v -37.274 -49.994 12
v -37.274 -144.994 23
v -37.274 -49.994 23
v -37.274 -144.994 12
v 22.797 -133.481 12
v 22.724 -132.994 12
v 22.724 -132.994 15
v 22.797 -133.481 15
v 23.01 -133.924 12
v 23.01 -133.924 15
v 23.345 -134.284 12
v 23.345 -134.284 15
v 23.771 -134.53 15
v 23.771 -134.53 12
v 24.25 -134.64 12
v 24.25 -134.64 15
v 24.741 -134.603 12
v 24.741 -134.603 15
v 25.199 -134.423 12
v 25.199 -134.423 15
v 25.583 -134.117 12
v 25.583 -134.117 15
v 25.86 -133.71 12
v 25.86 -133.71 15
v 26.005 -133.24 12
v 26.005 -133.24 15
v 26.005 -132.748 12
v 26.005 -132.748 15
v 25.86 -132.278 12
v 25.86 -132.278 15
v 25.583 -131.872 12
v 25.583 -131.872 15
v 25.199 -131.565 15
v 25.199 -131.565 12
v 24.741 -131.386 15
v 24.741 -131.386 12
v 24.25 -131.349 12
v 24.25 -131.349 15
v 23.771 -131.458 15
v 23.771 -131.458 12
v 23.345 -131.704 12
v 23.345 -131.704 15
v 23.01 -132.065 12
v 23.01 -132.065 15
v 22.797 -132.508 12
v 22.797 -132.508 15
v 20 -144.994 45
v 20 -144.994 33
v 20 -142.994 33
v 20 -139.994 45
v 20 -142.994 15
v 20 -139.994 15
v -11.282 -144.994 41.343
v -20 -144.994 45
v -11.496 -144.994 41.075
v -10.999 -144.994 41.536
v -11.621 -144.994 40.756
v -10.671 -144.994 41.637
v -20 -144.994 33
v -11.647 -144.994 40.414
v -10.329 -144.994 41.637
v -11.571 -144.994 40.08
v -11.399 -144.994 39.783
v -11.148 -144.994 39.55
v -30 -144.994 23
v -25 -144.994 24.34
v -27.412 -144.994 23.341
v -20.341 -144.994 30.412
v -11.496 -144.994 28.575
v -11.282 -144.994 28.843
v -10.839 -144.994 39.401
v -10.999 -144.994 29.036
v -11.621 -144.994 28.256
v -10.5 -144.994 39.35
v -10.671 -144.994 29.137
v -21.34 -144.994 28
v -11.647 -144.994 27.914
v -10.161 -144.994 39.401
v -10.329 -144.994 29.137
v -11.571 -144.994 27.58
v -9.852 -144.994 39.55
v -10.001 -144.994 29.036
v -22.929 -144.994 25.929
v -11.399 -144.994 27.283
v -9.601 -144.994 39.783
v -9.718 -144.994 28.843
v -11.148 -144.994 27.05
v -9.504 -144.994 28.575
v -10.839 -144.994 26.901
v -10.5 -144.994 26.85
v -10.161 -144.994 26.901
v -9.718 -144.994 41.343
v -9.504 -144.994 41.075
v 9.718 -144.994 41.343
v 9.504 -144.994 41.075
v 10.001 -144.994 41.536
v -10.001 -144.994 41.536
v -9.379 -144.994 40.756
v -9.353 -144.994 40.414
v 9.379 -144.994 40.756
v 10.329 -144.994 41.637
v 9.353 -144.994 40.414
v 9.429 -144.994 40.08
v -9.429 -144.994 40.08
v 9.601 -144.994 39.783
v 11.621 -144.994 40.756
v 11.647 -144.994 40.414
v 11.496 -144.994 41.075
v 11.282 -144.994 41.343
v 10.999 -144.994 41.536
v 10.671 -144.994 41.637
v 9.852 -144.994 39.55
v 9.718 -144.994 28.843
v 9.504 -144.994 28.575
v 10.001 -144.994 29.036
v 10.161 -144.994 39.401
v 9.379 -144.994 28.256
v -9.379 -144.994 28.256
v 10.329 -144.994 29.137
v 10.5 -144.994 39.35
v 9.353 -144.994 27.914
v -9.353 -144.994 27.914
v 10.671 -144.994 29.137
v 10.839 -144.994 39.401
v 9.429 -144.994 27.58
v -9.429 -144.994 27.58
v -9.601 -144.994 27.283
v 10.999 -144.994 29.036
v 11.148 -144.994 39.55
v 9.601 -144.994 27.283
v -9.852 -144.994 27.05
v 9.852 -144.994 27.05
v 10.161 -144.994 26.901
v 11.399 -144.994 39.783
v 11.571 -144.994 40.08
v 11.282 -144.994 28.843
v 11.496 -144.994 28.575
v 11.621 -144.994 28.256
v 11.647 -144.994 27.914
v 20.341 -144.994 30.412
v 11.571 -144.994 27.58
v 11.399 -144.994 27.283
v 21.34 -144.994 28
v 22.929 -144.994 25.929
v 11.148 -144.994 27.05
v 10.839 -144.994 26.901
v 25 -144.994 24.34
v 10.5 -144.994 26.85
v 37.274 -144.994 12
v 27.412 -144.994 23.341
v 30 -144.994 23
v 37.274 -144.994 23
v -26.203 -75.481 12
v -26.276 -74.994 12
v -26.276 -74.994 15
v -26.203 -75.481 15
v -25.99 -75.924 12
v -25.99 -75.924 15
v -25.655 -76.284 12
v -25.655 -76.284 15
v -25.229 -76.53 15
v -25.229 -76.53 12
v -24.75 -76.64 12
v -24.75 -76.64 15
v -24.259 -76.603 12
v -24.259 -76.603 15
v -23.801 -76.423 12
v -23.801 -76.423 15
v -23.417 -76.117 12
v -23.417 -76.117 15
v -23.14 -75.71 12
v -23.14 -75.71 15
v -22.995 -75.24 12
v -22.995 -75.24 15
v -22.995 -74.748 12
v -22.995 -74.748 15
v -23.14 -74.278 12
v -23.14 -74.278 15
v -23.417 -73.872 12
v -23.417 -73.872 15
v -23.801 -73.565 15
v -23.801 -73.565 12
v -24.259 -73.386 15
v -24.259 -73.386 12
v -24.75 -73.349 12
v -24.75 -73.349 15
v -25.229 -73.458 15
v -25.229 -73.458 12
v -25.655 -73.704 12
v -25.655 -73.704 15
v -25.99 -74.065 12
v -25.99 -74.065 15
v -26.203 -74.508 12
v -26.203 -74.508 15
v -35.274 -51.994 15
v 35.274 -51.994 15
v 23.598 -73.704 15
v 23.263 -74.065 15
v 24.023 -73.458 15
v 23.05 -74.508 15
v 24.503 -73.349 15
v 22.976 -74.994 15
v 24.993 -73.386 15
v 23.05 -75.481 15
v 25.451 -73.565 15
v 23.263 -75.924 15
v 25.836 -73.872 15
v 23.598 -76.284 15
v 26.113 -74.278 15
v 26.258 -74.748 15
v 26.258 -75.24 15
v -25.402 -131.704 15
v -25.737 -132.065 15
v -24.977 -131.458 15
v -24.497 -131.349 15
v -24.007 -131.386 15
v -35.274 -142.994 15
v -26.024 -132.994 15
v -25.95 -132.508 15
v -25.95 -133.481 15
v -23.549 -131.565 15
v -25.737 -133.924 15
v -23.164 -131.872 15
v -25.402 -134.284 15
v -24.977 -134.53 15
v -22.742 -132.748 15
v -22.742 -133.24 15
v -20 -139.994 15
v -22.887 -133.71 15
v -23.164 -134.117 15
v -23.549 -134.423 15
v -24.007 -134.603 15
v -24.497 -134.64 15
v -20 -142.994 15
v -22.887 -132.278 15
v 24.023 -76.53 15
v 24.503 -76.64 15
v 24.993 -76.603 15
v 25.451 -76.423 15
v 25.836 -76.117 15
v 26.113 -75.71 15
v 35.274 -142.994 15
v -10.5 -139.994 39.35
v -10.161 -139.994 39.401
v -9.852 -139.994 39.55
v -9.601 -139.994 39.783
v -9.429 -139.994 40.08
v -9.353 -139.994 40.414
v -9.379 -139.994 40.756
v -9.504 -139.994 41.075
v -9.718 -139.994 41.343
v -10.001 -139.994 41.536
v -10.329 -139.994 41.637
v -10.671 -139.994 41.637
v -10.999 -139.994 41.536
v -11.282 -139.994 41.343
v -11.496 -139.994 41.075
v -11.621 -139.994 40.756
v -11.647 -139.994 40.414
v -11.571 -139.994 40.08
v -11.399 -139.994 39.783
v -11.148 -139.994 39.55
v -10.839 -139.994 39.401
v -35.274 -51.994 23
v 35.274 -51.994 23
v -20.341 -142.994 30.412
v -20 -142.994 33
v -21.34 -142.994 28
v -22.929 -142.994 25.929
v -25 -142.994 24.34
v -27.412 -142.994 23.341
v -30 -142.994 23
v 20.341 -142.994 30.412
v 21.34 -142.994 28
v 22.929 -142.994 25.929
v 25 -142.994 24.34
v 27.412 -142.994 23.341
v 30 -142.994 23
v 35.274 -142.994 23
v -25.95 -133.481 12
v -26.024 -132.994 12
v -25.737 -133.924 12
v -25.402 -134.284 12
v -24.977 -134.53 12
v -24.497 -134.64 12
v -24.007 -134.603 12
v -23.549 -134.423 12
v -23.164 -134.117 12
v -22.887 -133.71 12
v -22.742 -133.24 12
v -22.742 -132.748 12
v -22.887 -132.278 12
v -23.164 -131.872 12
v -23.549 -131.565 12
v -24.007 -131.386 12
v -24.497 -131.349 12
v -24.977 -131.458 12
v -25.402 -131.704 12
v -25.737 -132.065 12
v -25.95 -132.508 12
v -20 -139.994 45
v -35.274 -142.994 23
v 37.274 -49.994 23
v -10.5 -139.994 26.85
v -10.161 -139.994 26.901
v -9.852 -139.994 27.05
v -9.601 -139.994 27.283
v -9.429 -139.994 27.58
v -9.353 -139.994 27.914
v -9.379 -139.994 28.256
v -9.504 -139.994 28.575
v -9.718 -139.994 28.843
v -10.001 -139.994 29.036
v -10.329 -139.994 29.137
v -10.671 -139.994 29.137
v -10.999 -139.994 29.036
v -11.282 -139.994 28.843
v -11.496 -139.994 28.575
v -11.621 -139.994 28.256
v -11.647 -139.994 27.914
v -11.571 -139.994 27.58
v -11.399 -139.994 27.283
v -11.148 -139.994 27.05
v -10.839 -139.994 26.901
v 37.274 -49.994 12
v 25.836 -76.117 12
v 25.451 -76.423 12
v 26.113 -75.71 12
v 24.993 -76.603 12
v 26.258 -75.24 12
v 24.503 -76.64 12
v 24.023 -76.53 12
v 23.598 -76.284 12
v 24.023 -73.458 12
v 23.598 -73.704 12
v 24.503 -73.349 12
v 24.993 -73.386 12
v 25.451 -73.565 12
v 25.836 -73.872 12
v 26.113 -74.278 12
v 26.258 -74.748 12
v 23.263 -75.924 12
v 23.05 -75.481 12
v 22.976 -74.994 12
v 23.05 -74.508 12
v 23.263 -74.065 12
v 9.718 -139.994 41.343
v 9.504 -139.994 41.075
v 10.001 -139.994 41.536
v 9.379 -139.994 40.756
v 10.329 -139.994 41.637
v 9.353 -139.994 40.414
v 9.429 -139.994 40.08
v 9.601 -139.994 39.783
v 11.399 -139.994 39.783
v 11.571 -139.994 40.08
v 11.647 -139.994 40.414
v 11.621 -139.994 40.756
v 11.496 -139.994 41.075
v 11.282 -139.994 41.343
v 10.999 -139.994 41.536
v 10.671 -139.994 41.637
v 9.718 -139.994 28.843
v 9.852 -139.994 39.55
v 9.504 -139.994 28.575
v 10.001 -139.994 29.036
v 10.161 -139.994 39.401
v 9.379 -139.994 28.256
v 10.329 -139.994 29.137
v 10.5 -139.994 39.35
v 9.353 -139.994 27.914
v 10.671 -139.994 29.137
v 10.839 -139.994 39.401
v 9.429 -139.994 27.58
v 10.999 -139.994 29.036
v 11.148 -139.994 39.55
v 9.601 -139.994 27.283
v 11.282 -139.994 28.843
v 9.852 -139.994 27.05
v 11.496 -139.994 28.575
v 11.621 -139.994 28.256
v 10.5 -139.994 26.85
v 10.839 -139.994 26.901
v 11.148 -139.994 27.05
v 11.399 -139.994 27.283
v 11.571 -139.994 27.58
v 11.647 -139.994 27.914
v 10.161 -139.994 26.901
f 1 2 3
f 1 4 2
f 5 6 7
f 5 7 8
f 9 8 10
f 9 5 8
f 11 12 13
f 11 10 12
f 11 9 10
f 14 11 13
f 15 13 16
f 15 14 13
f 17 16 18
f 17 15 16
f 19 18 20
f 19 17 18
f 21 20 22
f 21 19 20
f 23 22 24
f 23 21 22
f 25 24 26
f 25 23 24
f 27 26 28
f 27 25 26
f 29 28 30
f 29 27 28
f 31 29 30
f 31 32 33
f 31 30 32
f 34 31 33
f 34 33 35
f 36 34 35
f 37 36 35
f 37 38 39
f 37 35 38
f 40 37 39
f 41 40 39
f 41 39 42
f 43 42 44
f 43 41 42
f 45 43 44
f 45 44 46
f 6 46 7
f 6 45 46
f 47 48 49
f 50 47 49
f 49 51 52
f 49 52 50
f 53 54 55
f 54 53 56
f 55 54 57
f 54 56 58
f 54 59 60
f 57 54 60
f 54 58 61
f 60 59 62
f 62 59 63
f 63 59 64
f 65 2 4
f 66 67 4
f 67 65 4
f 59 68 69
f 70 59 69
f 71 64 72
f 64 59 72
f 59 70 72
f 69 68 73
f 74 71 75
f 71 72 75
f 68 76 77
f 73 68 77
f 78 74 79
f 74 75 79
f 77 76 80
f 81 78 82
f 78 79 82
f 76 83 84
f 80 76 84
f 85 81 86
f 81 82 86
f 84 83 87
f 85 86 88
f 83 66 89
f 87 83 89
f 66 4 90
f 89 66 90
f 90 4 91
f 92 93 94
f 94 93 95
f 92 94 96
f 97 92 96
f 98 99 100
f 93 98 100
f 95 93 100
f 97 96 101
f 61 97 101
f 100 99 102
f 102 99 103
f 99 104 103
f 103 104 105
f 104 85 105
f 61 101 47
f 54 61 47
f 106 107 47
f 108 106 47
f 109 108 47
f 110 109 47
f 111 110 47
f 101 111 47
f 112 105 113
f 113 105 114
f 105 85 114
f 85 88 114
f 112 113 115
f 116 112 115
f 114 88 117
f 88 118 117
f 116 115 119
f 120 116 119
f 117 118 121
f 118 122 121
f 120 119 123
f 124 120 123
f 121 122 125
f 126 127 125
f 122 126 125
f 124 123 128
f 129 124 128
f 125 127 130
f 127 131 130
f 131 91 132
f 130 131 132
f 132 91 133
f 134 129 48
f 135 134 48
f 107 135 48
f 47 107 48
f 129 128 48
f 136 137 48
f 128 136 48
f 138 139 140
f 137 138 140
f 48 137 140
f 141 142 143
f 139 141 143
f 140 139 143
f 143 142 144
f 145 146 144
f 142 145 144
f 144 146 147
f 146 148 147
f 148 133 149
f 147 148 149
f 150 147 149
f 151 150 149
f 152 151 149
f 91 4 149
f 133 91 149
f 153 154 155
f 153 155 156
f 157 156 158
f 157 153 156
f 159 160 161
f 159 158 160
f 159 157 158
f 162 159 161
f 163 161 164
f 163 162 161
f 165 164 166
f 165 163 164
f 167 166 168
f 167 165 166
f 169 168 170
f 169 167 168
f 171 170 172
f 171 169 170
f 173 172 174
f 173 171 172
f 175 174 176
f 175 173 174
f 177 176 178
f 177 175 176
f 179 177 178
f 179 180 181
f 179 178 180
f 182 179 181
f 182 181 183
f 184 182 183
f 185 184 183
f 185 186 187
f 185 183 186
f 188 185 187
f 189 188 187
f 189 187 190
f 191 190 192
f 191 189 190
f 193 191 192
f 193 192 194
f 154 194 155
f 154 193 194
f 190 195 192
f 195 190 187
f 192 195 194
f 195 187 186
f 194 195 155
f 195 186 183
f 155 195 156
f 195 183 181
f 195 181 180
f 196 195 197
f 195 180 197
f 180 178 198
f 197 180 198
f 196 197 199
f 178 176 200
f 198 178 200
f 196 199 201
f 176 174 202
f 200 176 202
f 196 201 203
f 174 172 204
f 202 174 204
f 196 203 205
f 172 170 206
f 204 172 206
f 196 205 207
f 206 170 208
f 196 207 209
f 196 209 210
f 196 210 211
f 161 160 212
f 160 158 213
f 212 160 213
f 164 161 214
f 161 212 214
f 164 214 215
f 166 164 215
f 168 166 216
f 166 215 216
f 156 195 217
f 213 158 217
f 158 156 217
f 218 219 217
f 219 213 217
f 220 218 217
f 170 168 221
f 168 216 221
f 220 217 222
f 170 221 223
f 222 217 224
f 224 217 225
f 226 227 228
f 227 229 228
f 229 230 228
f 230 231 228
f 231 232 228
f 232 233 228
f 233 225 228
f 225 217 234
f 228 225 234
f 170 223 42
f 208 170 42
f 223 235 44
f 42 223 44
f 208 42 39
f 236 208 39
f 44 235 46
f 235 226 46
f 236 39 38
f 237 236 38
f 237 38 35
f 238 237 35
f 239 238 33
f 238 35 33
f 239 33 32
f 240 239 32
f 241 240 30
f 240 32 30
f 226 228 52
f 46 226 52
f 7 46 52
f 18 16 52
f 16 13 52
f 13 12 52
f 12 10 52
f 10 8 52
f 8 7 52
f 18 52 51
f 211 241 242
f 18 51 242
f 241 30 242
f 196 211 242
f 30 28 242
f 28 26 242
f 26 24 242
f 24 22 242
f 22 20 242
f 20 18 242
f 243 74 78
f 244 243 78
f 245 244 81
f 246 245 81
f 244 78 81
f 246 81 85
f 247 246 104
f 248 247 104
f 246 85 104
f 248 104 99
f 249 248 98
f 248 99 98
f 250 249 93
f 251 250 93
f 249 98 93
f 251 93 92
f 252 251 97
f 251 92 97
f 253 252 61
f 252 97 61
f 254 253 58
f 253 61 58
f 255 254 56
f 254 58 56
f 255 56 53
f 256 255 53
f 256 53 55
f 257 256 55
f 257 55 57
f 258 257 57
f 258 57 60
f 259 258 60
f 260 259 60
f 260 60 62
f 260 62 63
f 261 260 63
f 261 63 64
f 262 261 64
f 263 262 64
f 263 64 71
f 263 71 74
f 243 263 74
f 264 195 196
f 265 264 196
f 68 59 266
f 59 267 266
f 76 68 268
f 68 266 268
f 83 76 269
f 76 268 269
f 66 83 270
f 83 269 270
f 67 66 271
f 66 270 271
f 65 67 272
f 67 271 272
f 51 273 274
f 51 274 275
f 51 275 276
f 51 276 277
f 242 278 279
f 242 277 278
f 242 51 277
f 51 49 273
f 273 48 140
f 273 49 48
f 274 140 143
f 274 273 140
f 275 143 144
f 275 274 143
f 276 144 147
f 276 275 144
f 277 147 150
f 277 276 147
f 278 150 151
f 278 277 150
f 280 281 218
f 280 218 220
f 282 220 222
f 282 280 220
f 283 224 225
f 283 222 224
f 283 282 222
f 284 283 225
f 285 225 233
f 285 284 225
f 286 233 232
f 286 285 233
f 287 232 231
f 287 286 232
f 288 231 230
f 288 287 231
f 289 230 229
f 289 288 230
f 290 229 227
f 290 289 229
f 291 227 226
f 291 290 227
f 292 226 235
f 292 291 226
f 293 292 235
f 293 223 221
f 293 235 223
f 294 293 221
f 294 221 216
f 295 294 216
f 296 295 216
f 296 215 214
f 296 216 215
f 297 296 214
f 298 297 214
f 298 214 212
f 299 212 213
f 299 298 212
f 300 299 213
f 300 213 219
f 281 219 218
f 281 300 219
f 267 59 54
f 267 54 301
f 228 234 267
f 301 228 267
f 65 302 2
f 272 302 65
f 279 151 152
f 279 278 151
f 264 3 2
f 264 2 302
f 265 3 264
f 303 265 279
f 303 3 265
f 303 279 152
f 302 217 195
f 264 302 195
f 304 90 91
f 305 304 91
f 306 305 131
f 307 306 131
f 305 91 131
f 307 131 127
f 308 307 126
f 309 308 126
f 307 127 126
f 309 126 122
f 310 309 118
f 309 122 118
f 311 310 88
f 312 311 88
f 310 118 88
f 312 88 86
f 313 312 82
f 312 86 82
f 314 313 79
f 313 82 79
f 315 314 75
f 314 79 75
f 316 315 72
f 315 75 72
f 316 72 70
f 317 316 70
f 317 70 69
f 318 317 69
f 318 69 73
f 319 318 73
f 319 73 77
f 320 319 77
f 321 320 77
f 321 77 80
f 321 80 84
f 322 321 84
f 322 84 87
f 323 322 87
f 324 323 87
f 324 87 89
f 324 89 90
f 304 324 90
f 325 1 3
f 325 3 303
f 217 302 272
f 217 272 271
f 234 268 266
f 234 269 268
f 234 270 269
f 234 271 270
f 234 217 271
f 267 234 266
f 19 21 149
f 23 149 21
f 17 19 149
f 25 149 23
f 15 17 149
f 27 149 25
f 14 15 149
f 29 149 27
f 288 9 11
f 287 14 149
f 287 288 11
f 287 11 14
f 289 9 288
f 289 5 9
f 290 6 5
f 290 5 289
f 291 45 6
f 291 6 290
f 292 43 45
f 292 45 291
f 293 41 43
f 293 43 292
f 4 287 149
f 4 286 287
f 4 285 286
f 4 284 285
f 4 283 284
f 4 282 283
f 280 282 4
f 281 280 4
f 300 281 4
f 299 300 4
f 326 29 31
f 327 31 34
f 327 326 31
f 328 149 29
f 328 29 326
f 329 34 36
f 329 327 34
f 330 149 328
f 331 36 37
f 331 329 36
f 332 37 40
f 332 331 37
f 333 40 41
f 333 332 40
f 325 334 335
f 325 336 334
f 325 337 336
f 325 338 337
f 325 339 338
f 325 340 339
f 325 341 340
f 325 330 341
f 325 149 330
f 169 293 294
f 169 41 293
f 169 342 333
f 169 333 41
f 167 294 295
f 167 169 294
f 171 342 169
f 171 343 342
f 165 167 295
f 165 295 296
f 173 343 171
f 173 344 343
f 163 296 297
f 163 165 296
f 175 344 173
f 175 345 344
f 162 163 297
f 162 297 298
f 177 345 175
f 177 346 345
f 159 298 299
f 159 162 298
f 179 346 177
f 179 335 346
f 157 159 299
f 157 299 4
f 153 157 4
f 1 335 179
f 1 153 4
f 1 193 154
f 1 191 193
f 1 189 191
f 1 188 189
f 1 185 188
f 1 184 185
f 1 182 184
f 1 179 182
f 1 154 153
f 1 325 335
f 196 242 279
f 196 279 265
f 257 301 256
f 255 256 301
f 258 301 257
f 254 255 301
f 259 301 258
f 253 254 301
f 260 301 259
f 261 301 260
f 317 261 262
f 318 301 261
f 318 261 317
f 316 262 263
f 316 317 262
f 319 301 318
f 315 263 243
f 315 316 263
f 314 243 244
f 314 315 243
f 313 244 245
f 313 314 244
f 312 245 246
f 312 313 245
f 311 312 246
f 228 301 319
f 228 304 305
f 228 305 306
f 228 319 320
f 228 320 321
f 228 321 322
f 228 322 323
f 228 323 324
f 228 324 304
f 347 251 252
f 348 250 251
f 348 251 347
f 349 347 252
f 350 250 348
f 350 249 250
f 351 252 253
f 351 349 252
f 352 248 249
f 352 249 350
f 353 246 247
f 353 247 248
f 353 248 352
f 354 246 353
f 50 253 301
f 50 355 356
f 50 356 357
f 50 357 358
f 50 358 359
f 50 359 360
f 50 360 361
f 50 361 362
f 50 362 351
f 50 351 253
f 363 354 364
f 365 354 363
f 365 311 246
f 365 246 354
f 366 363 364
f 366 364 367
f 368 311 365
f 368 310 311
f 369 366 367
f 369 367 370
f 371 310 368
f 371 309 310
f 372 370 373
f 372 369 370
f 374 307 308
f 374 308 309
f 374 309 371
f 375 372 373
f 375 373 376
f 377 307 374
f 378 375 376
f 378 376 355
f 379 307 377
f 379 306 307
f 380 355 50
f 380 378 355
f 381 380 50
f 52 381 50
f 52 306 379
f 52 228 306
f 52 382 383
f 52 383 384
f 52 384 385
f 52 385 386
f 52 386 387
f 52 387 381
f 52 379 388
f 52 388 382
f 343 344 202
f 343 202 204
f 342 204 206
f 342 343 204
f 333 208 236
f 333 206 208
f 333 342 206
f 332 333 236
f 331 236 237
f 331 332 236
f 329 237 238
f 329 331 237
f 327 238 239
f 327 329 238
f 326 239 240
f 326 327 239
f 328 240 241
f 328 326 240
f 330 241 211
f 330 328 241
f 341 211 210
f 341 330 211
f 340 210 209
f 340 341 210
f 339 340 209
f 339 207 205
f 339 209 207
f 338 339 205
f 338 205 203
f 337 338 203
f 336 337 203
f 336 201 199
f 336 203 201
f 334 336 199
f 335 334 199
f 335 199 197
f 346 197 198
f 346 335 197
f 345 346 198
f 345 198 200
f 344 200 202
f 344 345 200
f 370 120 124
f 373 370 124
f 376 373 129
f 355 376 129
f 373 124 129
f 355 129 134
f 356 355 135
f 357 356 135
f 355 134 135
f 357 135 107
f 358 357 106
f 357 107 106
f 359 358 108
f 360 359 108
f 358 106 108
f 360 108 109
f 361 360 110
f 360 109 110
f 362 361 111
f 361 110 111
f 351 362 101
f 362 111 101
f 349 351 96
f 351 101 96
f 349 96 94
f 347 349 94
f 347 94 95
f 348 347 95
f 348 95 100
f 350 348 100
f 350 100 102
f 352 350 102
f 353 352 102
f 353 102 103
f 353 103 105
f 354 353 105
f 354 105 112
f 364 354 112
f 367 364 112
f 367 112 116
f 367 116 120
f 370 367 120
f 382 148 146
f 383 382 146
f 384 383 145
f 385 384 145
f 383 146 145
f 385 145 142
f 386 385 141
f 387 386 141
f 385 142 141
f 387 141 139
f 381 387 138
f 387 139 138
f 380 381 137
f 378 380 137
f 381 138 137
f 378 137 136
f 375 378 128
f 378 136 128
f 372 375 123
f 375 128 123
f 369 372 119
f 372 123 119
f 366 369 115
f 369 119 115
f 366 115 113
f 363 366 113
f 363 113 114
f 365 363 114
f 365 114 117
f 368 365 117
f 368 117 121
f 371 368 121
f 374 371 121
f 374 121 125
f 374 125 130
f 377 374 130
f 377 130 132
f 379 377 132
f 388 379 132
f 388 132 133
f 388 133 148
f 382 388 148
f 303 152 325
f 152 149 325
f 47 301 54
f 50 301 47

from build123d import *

# Parameters (mm, degrees)
CROQUIS1_W                  = 30
CROQUIS1_H                  = 30
SALIENTE_EXTRUIR1_DEPTH     = 15
CROQUIS6_R                  = 11.175
CORTAR_EXTRUIR1_DEPTH       = 10
CROQUIS11_W                 = 17.25
CROQUIS11_H                 = 40
SALIENTE_EXTRUIR3_DEPTH     = 12
CORTAR_EXTRUIR2_DEPTH       = 220.794464504
CORTAR_EXTRUIR2_DEPTH_BACK  = 220.794464504
CROQUIS9_R                  = 5
CROQUIS14_W                 = 64.5
CROQUIS14_H                 = 82
SALIENTE_EXTRUIR4_DEPTH     = 40
CORTAR_EXTRUIR3_START       = -10
CROQUIS10_R                 = 11.175
CORTAR_EXTRUIR3_DEPTH       = 10
CORTAR_EXTRUIR5_DEPTH       = 230.716361252
CORTAR_EXTRUIR5_DEPTH_BACK  = 10
CROQUIS13_R                 = 11.175
CORTAR_EXTRUIR6_DEPTH       = 183.220714139
CROQUIS16_W                 = 64.5
CROQUIS16_H                 = 82
CROQUIS16_W_2               = 56
CROQUIS16_H_2               = 77
SALIENTE_EXTRUIR5_DEPTH     = 5
CROQUIS17_W                 = 30
CROQUIS17_H                 = 30
CORTAR_EXTRUIR7_DEPTH       = 218.102899858
CROQUIS19_W                 = 18
CROQUIS19_H                 = 4.5
SALIENTE_EXTRUIR6_DEPTH     = 60
CROQUIS22_W                 = 12
CROQUIS22_H                 = 15
CORTAR_EXTRUIR8_DEPTH       = 2
CROQUIS23_W                 = 3.8
CROQUIS23_H                 = 47
SALIENTE_EXTRUIR8_DEPTH     = 19.8
CROQUIS24_R                 = 8.35
CROQUIS24_R_2               = 1
CROQUIS24_W                 = 4.8
CROQUIS24_H                 = 12
CORTAR_EXTRUIR10_DEPTH      = 241.553879883
CROQUIS25_W                 = 3.8
CROQUIS25_H                 = 47
SALIENTE_EXTRUIR9_DEPTH     = 2
REDONDEO2_R                 = 3
CROQUIS26_W                 = 47
CROQUIS26_H                 = 3.8
SALIENTE_EXTRUIR10_DEPTH    = 21.8
REDONDEO3_R                 = 3
CROQUIS28_R                 = 8.35
CROQUIS28_R_2               = 1
CROQUIS28_W                 = 12
CROQUIS28_H                 = 4.8
CORTAR_EXTRUIR11_DEPTH      = 21.8
CORTAR_EXTRUIR12_DEPTH      = 231.964513782
CORTAR_EXTRUIR12_DEPTH_BACK = 231.964513782
CORTAR_EXTRUIR13_DEPTH      = 218.102899858
CORTAR_EXTRUIR13_DEPTH_BACK = 218.102899858
CROQUIS29_R                 = 1.65
CORTAR_EXTRUIR14_DEPTH      = 221.700405815
CORTAR_EXTRUIR14_DEPTH_BACK = 8
CROQUIS32_R                 = 5.15
CROQUIS34_W                 = 22.273731586
CROQUIS34_H                 = 49.346142378
SALIENTE_EXTRUIR11_DEPTH    = 12
CORTAR_EXTRUIR17_DEPTH      = 233.924926242
CORTAR_EXTRUIR17_DEPTH_BACK = 233.924926242
CORTAR_EXTRUIR18_DEPTH      = 233.924926242
CORTAR_EXTRUIR18_DEPTH_BACK = 233.924926242
CORTAR_EXTRUIR19_DEPTH      = 225.26027095
CORTAR_EXTRUIR19_DEPTH_BACK = 225.26027095
CROQUIS38_R                 = 1.3
CORTAR_EXTRUIR20_START      = -8.5
CROQUIS39_W                 = 74.547463172
CROQUIS39_H                 = 11
CORTAR_EXTRUIR20_DEPTH      = 8.5
CROQUIS40_W                 = 17
CROQUIS40_H                 = 22
SALIENTE_EXTRUIR12_DEPTH    = 15
CROQUIS41_R                 = 1.3
CORTAR_EXTRUIR25_DEPTH      = 15
CROQUIS42_W                 = 12.6
CROQUIS42_H                 = 7
CORTAR_EXTRUIR26_DEPTH      = 7.1
CROQUIS43_W                 = 12.6
CROQUIS43_H                 = 10
CORTAR_EXTRUIR27_DEPTH      = 12.1
CORTAR_EXTRUIR28_DEPTH      = 218.102899858
CORTAR_EXTRUIR28_DEPTH_BACK = 218.102899858
CROQUIS44_W                 = 157.170171999
CROQUIS44_H                 = 272.215906008
CROQUIS44_W_2               = 74.547463172
CROQUIS44_H_2               = 95
CORTAR_EXTRUIR29_DEPTH      = 151.45827812
CORTAR_EXTRUIR29_DEPTH_BACK = 12
CROQUIS45_W                 = 74.547463172
CROQUIS45_H                 = 95
CROQUIS46_W                 = 40
CROQUIS46_H                 = 5
SALIENTE_EXTRUIR13_DEPTH    = 30
CROQUIS47_W                 = 74.547463172
CROQUIS47_H                 = 95
CROQUIS47_W_2               = 70.547463172
CROQUIS47_H_2               = 91
SALIENTE_EXTRUIR14_DEPTH    = 8
REDONDEO4_R                 = 10
CROQUIS49_R                 = 1.15
CORTAR_EXTRUIR30_DEPTH      = 8


with BuildPart() as part:
    # Croquis1 → Saliente-Extruir1 (new body)
    with BuildSketch(Plane.XY):
        with BuildLine():
            Line((-55.75, 30), (-32.25, 30))
            Line((-32.25, 30), (-32.25, -30))
            Line((-32.25, -30), (-55, -34.220247666))
            Line((-55, -34.220247666), (-55, -125.720247666))
            Line((-55, -125.720247666), (-37.273731586, -140.594352954))
            Line((-37.273731586, -140.594352954), (-37.273731586, -189.940495332))
            Line((-37.273731586, -189.940495332), (-55.75, -189.940495332))
            ThreePointArc((-55.75, -189.940495332), (-51.356645257, -200.54705351), (-40.750123148, -204.940495332))
            Line((-40.750123148, -204.940495332), (0, -204.940495332))
            Line((0, -204.940495332), (40.75, -204.940495332))
            ThreePointArc((40.75, -204.940495332), (51.356601718, -200.547097049), (55.75, -189.940495332))
            Line((55.75, -189.940495332), (37.273731586, -189.940495332))
            Line((37.273731586, -189.940495332), (37.273731586, -140.594352954))
            Line((37.273731586, -140.594352954), (55, -125.720247666))
            Line((55, -125.720247666), (55, -34.220247666))
            Line((55, -34.220247666), (32.25, -30))
            Line((32.25, -30), (32.25, 30))
            Line((32.25, 30), (55.75, 30))
            ThreePointArc((55.75, 30), (51.356601718, 40.606601718), (40.75, 45))
            Line((40.75, 45), (0, 45))
            Line((0, 45), (-40.750123148, 45))
            ThreePointArc((-40.750123148, 45), (-51.356645257, 40.606558178), (-55.75, 30))
        make_face()
        Rectangle(CROQUIS1_W, CROQUIS1_H, mode=Mode.SUBTRACT)
    extrude(amount=SALIENTE_EXTRUIR1_DEPTH)

    # Croquis6 → Cortar-Extruir1 (cut)
    with BuildSketch(Plane.ZY.offset(32.25)):
        with Locations((3, 0)):
            Circle(CROQUIS6_R)
    extrude(amount=-CORTAR_EXTRUIR1_DEPTH, mode=Mode.SUBTRACT)

    # Croquis11 → Saliente-Extruir3 (add)
    with BuildSketch(Plane(origin=(0, 0, 0), x_dir=(-1, 0, 0), z_dir=(0, 0, -1))):
        with Locations((23.625, 0)):
            Rectangle(CROQUIS11_W, CROQUIS11_H)
        with Locations((-23.625, 0)):
            Rectangle(CROQUIS11_W, CROQUIS11_H)
    extrude(amount=SALIENTE_EXTRUIR3_DEPTH)

    # Croquis9 → Cortar-Extruir2 (cut, two sides: drawn at the far end of the back side and taken through both)
    with BuildSketch(Plane.ZY.offset(22.25).offset(-CORTAR_EXTRUIR2_DEPTH_BACK)):
        with Locations(Location((3, 0, 0), (0, 0, 233.130102354))):
            Circle(CROQUIS9_R)
    extrude(amount=CORTAR_EXTRUIR2_DEPTH + CORTAR_EXTRUIR2_DEPTH_BACK, mode=Mode.SUBTRACT)

    # Croquis14 → Saliente-Extruir4 (add)
    with BuildSketch(Plane.XY.offset(15)):
        with Locations((0, 0.593167368)):
            Rectangle(CROQUIS14_W, CROQUIS14_H)
    extrude(amount=SALIENTE_EXTRUIR4_DEPTH)

    # Croquis10 → Cortar-Extruir3 (cut)
    with BuildSketch(Plane(origin=(32.25, 0, 0), x_dir=(0, 0, -1), z_dir=(1, 0, 0)).offset(CORTAR_EXTRUIR3_START)):
        with Locations((-3, 0)):
            Circle(CROQUIS10_R)
    extrude(amount=CORTAR_EXTRUIR3_DEPTH, mode=Mode.SUBTRACT)

    # Croquis13 → Cortar-Extruir5 (cut, two sides: drawn at the far end of the back side and taken through both)
    with BuildSketch(Plane.ZY.offset(32.25).offset(-CORTAR_EXTRUIR5_DEPTH_BACK)):
        with Locations((3, 0)):
            Circle(CROQUIS13_R)
    extrude(amount=CORTAR_EXTRUIR5_DEPTH + CORTAR_EXTRUIR5_DEPTH_BACK, mode=Mode.SUBTRACT)

    # Croquis15 → Cortar-Extruir6 (cut, through all)
    with BuildSketch(Plane.XZ.offset(40.406832632)):
        with BuildLine():
            Line((-22.25, 15), (-22.25, 35))
            ThreePointArc((-22.25, 35), (-19.321067812, 42.071067812), (-12.25, 45))
            Line((-12.25, 45), (12.25, 45))
            ThreePointArc((12.25, 45), (19.321067812, 42.071067812), (22.25, 35))
            Line((22.25, 35), (22.25, 15))
            Line((22.25, 15), (-22.25, 15))
        make_face()
    extrude(amount=-CORTAR_EXTRUIR6_DEPTH, mode=Mode.SUBTRACT)

    # Croquis16 → Saliente-Extruir5 (add)
    with BuildSketch(Plane.XY.offset(55)):
        with Locations((0, 0.593167368)):
            Rectangle(CROQUIS16_W, CROQUIS16_H)
        Rectangle(CROQUIS16_W_2, CROQUIS16_H_2, mode=Mode.SUBTRACT)
    extrude(amount=SALIENTE_EXTRUIR5_DEPTH)

    # Croquis17 → Cortar-Extruir7 (cut, through all)
    with BuildSketch(Plane.XY.offset(15)):
        with Locations((0, 30)):
            Rectangle(CROQUIS17_W, CROQUIS17_H)
    extrude(amount=-CORTAR_EXTRUIR7_DEPTH, mode=Mode.SUBTRACT)

    # Croquis19 → Saliente-Extruir6 (add)
    with BuildSketch(Plane(origin=(0, -15, 0), x_dir=(1, 0, 0), z_dir=(0, 1, 0))):
        with Locations((6, -12.75)):
            Rectangle(CROQUIS19_W, CROQUIS19_H)
    extrude(amount=SALIENTE_EXTRUIR6_DEPTH)

    # Croquis22 → Cortar-Extruir8 (cut)
    with BuildSketch(Plane(origin=(0, -15, 0), x_dir=(1, 0, 0), z_dir=(0, 1, 0))):
        with Locations((-9, -7.5)):
            Rectangle(CROQUIS22_W, CROQUIS22_H)
    extrude(amount=-CORTAR_EXTRUIR8_DEPTH, mode=Mode.SUBTRACT)

    # Croquis23 → Saliente-Extruir8 (add)
    with BuildSketch(Plane.XY.offset(15)):
        with Locations((53.1, -79.970247666)):
            Rectangle(CROQUIS23_W, CROQUIS23_H)
        with Locations((-53.1, -79.970247666)):
            Rectangle(CROQUIS23_W, CROQUIS23_H)
    extrude(amount=SALIENTE_EXTRUIR8_DEPTH)

    # Croquis24 → Cortar-Extruir10 (cut, through all)
    with BuildSketch(Plane(origin=(55, 0, 0), x_dir=(0, 0, -1), z_dir=(1, 0, 0))):
        with Locations((-25.3, -66.970247666)):
            Circle(CROQUIS24_R)
        with Locations((-25.3, -92.970247666)):
            Circle(CROQUIS24_R)
        with Locations((-16.3, -101.270247666)):
            Circle(CROQUIS24_R_2)
        with Locations((-33.7, -58.370247666)):
            Circle(CROQUIS24_R_2)
        with Locations((-16.1, -58.370247666)):
            Circle(CROQUIS24_R_2)
        with Locations((-33.5, -101.270247666)):
            Circle(CROQUIS24_R_2)
        with Locations((-17.7, -79.970247666)):
            Rectangle(CROQUIS24_W, CROQUIS24_H)
    extrude(amount=-CORTAR_EXTRUIR10_DEPTH, mode=Mode.SUBTRACT)

    # Croquis25 → Saliente-Extruir9 (add)
    with BuildSketch(Plane.XY.offset(34.8)):
        with Locations((-53.1, -79.970247666)):
            Rectangle(CROQUIS25_W, CROQUIS25_H)
        with Locations((53.1, -79.970247666)):
            Rectangle(CROQUIS25_W, CROQUIS25_H)
    extrude(amount=SALIENTE_EXTRUIR9_DEPTH)

    # Redondeo2
    redondeo2_edges = [part.edges().sort_by_distance(p)[0] for p in [
        (-53.1, -103.470247666, 36.8),
        (-53.1, -56.470247666, 36.8),
        (53.1, -103.470247666, 36.8),
        (53.1, -56.470247666, 36.8),
    ]]
    fillet(redondeo2_edges, radius=REDONDEO2_R)

    # Croquis26 → Saliente-Extruir10 (add)
    with BuildSketch(Plane.XY.offset(15)):
        with Locations((-6.1574e-05, -203.040495332)):
            Rectangle(CROQUIS26_W, CROQUIS26_H)
    extrude(amount=SALIENTE_EXTRUIR10_DEPTH)

    # Redondeo3
    redondeo3_edges = [part.edges().sort_by_distance(p)[0] for p in [
        (-23.500061574, -203.040495332, 36.8),
        (23.499938426, -203.040495332, 36.8),
    ]]
    fillet(redondeo3_edges, radius=REDONDEO3_R)

    # Croquis28 → Cortar-Extruir11 (cut)
    with BuildSketch(Plane.XZ.offset(204.940495332)):
        with Locations(Location((-13, 25.3, 0), (0, 0, 270))):
            Circle(CROQUIS28_R)
        with Locations(Location((13, 25.3, 0), (0, 0, 270))):
            Circle(CROQUIS28_R)
        with Locations(Location((-21.300061574, 16.3, 0), (0, 0, 270))):
            Circle(CROQUIS28_R_2)
        with Locations(Location((21.599938426, 33.7, 0), (0, 0, 270))):
            Circle(CROQUIS28_R_2)
        with Locations(Location((21.300061574, 16.3, 0), (0, 0, 270))):
            Circle(CROQUIS28_R_2)
        with Locations(Location((-21.599938426, 33.7, 0), (0, 0, 270))):
            Circle(CROQUIS28_R_2)
        with Locations((0, 17.7)):
            Rectangle(CROQUIS28_W, CROQUIS28_H)
    extrude(amount=-CORTAR_EXTRUIR11_DEPTH, mode=Mode.SUBTRACT)

    # Croquis12 → Cortar-Extruir12 (cut, two sides: drawn at the far end of the back side and taken through both)
    with BuildSketch(Plane(origin=(32.25, 0, 0), x_dir=(0, 0, -1), z_dir=(1, 0, 0)).offset(-CORTAR_EXTRUIR12_DEPTH_BACK)):
        with BuildLine():
            Line((0, 20), (12, 20))
            Line((12, 20), (12, 5))
            ThreePointArc((12, 5), (8.630857945, 14.604686356), (0, 20))
        make_face()
        with BuildLine():
            Line((12, -20), (12, -5))
            ThreePointArc((12, -5), (8.630857945, -14.604686356), (0, -20))
            Line((0, -20), (12, -20))
        make_face()
    extrude(amount=CORTAR_EXTRUIR12_DEPTH + CORTAR_EXTRUIR12_DEPTH_BACK, mode=Mode.SUBTRACT)

    # Croquis29 → Cortar-Extruir13 (cut, two sides: drawn at the far end of the back side and taken through both)
    with BuildSketch(Plane.XY.offset(15).offset(-CORTAR_EXTRUIR13_DEPTH_BACK)):
        with Locations(Location((-24.373731586, -132.994352954, 0), (0, 0, 180))):
            Circle(CROQUIS29_R)
        with Locations(Location((24.626268414, -74.994352954, 0), (0, 0, 180))):
            Circle(CROQUIS29_R)
        with Locations(Location((-24.626268414, -74.994352954, 0), (0, 0, 180))):
            Circle(CROQUIS29_R)
        with Locations(Location((24.373731586, -132.994352954, 0), (0, 0, 180))):
            Circle(CROQUIS29_R)
    extrude(amount=CORTAR_EXTRUIR13_DEPTH + CORTAR_EXTRUIR13_DEPTH_BACK, mode=Mode.SUBTRACT)

    # Croquis32 → Cortar-Extruir14 (cut, two sides: drawn at the far end of the back side and taken through both)
    with BuildSketch(Plane(origin=(0, 0, 0), x_dir=(-1, 0, 0), z_dir=(0, 0, -1)).offset(-CORTAR_EXTRUIR14_DEPTH_BACK)):
        with Locations(Location((-24.626268414, -74.994352954, 0), (0, 0, 180))):
            Circle(CROQUIS32_R)
        with Locations(Location((-24.373731586, -132.994352954, 0), (0, 0, 180))):
            Circle(CROQUIS32_R)
        with Locations(Location((24.373731586, -132.994352954, 0), (0, 0, 180))):
            Circle(CROQUIS32_R)
        with Locations(Location((24.626268414, -74.994352954, 0), (0, 0, 180))):
            Circle(CROQUIS32_R)
    extrude(amount=CORTAR_EXTRUIR14_DEPTH + CORTAR_EXTRUIR14_DEPTH_BACK, mode=Mode.SUBTRACT)

    # Croquis34 → Saliente-Extruir11 (add)
    with BuildSketch(Plane(origin=(0, 0, 0), x_dir=(-1, 0, 0), z_dir=(0, 0, -1))):
        with Locations((-26.136865793, -165.267424143)):
            Rectangle(CROQUIS34_W, CROQUIS34_H)
        with Locations((26.136865793, -165.267424143)):
            Rectangle(CROQUIS34_W, CROQUIS34_H)
    extrude(amount=SALIENTE_EXTRUIR11_DEPTH)

    # Croquis35 → Cortar-Extruir17 (cut, two sides: drawn at the far end of the back side and taken through both)
    with BuildSketch(Plane(origin=(37.273731586, 0, 0), x_dir=(0, 0, -1), z_dir=(1, 0, 0)).offset(-CORTAR_EXTRUIR17_DEPTH_BACK)):
        with BuildLine():
            Line((0, -140.594352954), (12, -140.594352954))
            Line((12, -140.594352954), (12, -148.594352954))
            ThreePointArc((12, -148.594352954), (6.568730644, -143.741256988), (0, -140.594352954))
        make_face()
        with BuildLine():
            Line((0, -189.940495332), (12, -189.940495332))
            Line((12, -189.940495332), (12, -181.940495332))
            ThreePointArc((12, -181.940495332), (6.568730644, -186.793591298), (0, -189.940495332))
        make_face()
    extrude(amount=CORTAR_EXTRUIR17_DEPTH + CORTAR_EXTRUIR17_DEPTH_BACK, mode=Mode.SUBTRACT)

    # Croquis37 → Cortar-Extruir18 (cut, two sides: drawn at the far end of the back side and taken through both)
    with BuildSketch(Plane.ZY.offset(37.273731586).offset(-CORTAR_EXTRUIR18_DEPTH_BACK)):
        with BuildLine():
            Line((-4.5, -155.267424143), (10.5, -155.267424143))
            Line((10.5, -155.267424143), (10.5, -181.267424143))
            ThreePointArc((10.5, -181.267424143), (9.328427125, -184.095851268), (6.5, -185.267424143))
            Line((6.5, -185.267424143), (-0.5, -185.267424143))
            ThreePointArc((-0.5, -185.267424143), (-3.328427125, -184.095851268), (-4.5, -181.267424143))
            Line((-4.5, -181.267424143), (-4.5, -155.267424143))
        make_face()
    extrude(amount=CORTAR_EXTRUIR18_DEPTH + CORTAR_EXTRUIR18_DEPTH_BACK, mode=Mode.SUBTRACT)

    # Croquis38 → Cortar-Extruir19 (cut, two sides: drawn at the far end of the back side and taken through both)
    with BuildSketch(Plane(origin=(0, 0, -12), x_dir=(-1, 0, 0), z_dir=(0, 0, -1)).offset(-CORTAR_EXTRUIR19_DEPTH_BACK)):
        with Locations((-26.136865793, -165.267424143)):
            Circle(CROQUIS38_R)
        with Locations((26.136865793, -165.267424143)):
            Circle(CROQUIS38_R)
    extrude(amount=CORTAR_EXTRUIR19_DEPTH + CORTAR_EXTRUIR19_DEPTH_BACK, mode=Mode.SUBTRACT)

    # Croquis39 → Cortar-Extruir20 (cut)
    with BuildSketch(Plane.XY.offset(15).offset(CORTAR_EXTRUIR20_START)):
        with Locations((0, -179.767424143)):
            Rectangle(CROQUIS39_W, CROQUIS39_H)
    extrude(amount=CORTAR_EXTRUIR20_DEPTH, mode=Mode.SUBTRACT)

    # Croquis40 → Saliente-Extruir12 (add)
    with BuildSketch(Plane.XY.offset(15)):
        with Locations((0, -163.267424143)):
            Rectangle(CROQUIS40_W, CROQUIS40_H)
    extrude(amount=SALIENTE_EXTRUIR12_DEPTH)

    # Croquis41 → Cortar-Extruir25 (cut)
    with BuildSketch(Plane.XY.offset(30)):
        with Locations((0, -153.767424143)):
            Circle(CROQUIS41_R)
    extrude(amount=-CORTAR_EXTRUIR25_DEPTH, mode=Mode.SUBTRACT)

    # Croquis42 → Cortar-Extruir26 (cut)
    with BuildSketch(Plane.XY.offset(30)):
        with Locations((0, -160.767424143)):
            Rectangle(CROQUIS42_W, CROQUIS42_H)
    extrude(amount=-CORTAR_EXTRUIR26_DEPTH, mode=Mode.SUBTRACT)

    # Croquis43 → Cortar-Extruir27 (cut)
    with BuildSketch(Plane.XY.offset(30)):
        with Locations((0, -169.267424143)):
            Rectangle(CROQUIS43_W, CROQUIS43_H)
    extrude(amount=-CORTAR_EXTRUIR27_DEPTH, mode=Mode.SUBTRACT)

    # Croquis44 → Cortar-Extruir28 (cut, two sides: drawn at the far end of the back side and taken through both)
    with BuildSketch(Plane.XY.offset(15).offset(-CORTAR_EXTRUIR28_DEPTH_BACK)):
        with Locations((3.185881864, -79.262273918)):
            Rectangle(CROQUIS44_W, CROQUIS44_H)
        with Locations((0, -97.494352954)):
            Rectangle(CROQUIS44_W_2, CROQUIS44_H_2, mode=Mode.SUBTRACT)
    extrude(amount=CORTAR_EXTRUIR28_DEPTH + CORTAR_EXTRUIR28_DEPTH_BACK, mode=Mode.SUBTRACT)

    # Croquis45 → Cortar-Extruir29 (cut, two sides: drawn at the far end of the back side and taken through both)
    with BuildSketch(Plane(origin=(0, 0, 0), x_dir=(-1, 0, 0), z_dir=(0, 0, -1)).offset(-CORTAR_EXTRUIR29_DEPTH_BACK)):
        with Locations((0, -97.494352954)):
            Rectangle(CROQUIS45_W, CROQUIS45_H)
    extrude(amount=CORTAR_EXTRUIR29_DEPTH + CORTAR_EXTRUIR29_DEPTH_BACK, mode=Mode.SUBTRACT)

    # Croquis46 → Saliente-Extruir13 (add)
    with BuildSketch(Plane.XY.offset(15)):
        with Locations((0, -142.494352954)):
            Rectangle(CROQUIS46_W, CROQUIS46_H)
    extrude(amount=SALIENTE_EXTRUIR13_DEPTH)

    # Croquis47 → Saliente-Extruir14 (add)
    with BuildSketch(Plane.XY.offset(15)):
        with Locations((0, -97.494352954)):
            Rectangle(CROQUIS47_W, CROQUIS47_H)
        with Locations((0, -97.494352954)):
            Rectangle(CROQUIS47_W_2, CROQUIS47_H_2, mode=Mode.SUBTRACT)
    extrude(amount=SALIENTE_EXTRUIR14_DEPTH)

    # Redondeo4
    redondeo4_edges = [part.edges().sort_by_distance(p)[0] for p in [
        (20, -143.994352954, 23),
        (-20, -143.994352954, 23),
    ]]
    fillet(redondeo4_edges, radius=REDONDEO4_R)

    # Croquis49 → Cortar-Extruir30 (cut)
    with BuildSketch(Plane.XZ.offset(144.994352954)):
        with Locations(Location((-10.5, 40.5, 0), (0, 0, 270))):
            Circle(CROQUIS49_R)
        with Locations(Location((10.5, 40.5, 0), (0, 0, 270))):
            Circle(CROQUIS49_R)
        with Locations(Location((-10.5, 28, 0), (0, 0, 270))):
            Circle(CROQUIS49_R)
        with Locations(Location((10.5, 28, 0), (0, 0, 270))):
            Circle(CROQUIS49_R)
    extrude(amount=-CORTAR_EXTRUIR30_DEPTH, mode=Mode.SUBTRACT)


solid = part.part
